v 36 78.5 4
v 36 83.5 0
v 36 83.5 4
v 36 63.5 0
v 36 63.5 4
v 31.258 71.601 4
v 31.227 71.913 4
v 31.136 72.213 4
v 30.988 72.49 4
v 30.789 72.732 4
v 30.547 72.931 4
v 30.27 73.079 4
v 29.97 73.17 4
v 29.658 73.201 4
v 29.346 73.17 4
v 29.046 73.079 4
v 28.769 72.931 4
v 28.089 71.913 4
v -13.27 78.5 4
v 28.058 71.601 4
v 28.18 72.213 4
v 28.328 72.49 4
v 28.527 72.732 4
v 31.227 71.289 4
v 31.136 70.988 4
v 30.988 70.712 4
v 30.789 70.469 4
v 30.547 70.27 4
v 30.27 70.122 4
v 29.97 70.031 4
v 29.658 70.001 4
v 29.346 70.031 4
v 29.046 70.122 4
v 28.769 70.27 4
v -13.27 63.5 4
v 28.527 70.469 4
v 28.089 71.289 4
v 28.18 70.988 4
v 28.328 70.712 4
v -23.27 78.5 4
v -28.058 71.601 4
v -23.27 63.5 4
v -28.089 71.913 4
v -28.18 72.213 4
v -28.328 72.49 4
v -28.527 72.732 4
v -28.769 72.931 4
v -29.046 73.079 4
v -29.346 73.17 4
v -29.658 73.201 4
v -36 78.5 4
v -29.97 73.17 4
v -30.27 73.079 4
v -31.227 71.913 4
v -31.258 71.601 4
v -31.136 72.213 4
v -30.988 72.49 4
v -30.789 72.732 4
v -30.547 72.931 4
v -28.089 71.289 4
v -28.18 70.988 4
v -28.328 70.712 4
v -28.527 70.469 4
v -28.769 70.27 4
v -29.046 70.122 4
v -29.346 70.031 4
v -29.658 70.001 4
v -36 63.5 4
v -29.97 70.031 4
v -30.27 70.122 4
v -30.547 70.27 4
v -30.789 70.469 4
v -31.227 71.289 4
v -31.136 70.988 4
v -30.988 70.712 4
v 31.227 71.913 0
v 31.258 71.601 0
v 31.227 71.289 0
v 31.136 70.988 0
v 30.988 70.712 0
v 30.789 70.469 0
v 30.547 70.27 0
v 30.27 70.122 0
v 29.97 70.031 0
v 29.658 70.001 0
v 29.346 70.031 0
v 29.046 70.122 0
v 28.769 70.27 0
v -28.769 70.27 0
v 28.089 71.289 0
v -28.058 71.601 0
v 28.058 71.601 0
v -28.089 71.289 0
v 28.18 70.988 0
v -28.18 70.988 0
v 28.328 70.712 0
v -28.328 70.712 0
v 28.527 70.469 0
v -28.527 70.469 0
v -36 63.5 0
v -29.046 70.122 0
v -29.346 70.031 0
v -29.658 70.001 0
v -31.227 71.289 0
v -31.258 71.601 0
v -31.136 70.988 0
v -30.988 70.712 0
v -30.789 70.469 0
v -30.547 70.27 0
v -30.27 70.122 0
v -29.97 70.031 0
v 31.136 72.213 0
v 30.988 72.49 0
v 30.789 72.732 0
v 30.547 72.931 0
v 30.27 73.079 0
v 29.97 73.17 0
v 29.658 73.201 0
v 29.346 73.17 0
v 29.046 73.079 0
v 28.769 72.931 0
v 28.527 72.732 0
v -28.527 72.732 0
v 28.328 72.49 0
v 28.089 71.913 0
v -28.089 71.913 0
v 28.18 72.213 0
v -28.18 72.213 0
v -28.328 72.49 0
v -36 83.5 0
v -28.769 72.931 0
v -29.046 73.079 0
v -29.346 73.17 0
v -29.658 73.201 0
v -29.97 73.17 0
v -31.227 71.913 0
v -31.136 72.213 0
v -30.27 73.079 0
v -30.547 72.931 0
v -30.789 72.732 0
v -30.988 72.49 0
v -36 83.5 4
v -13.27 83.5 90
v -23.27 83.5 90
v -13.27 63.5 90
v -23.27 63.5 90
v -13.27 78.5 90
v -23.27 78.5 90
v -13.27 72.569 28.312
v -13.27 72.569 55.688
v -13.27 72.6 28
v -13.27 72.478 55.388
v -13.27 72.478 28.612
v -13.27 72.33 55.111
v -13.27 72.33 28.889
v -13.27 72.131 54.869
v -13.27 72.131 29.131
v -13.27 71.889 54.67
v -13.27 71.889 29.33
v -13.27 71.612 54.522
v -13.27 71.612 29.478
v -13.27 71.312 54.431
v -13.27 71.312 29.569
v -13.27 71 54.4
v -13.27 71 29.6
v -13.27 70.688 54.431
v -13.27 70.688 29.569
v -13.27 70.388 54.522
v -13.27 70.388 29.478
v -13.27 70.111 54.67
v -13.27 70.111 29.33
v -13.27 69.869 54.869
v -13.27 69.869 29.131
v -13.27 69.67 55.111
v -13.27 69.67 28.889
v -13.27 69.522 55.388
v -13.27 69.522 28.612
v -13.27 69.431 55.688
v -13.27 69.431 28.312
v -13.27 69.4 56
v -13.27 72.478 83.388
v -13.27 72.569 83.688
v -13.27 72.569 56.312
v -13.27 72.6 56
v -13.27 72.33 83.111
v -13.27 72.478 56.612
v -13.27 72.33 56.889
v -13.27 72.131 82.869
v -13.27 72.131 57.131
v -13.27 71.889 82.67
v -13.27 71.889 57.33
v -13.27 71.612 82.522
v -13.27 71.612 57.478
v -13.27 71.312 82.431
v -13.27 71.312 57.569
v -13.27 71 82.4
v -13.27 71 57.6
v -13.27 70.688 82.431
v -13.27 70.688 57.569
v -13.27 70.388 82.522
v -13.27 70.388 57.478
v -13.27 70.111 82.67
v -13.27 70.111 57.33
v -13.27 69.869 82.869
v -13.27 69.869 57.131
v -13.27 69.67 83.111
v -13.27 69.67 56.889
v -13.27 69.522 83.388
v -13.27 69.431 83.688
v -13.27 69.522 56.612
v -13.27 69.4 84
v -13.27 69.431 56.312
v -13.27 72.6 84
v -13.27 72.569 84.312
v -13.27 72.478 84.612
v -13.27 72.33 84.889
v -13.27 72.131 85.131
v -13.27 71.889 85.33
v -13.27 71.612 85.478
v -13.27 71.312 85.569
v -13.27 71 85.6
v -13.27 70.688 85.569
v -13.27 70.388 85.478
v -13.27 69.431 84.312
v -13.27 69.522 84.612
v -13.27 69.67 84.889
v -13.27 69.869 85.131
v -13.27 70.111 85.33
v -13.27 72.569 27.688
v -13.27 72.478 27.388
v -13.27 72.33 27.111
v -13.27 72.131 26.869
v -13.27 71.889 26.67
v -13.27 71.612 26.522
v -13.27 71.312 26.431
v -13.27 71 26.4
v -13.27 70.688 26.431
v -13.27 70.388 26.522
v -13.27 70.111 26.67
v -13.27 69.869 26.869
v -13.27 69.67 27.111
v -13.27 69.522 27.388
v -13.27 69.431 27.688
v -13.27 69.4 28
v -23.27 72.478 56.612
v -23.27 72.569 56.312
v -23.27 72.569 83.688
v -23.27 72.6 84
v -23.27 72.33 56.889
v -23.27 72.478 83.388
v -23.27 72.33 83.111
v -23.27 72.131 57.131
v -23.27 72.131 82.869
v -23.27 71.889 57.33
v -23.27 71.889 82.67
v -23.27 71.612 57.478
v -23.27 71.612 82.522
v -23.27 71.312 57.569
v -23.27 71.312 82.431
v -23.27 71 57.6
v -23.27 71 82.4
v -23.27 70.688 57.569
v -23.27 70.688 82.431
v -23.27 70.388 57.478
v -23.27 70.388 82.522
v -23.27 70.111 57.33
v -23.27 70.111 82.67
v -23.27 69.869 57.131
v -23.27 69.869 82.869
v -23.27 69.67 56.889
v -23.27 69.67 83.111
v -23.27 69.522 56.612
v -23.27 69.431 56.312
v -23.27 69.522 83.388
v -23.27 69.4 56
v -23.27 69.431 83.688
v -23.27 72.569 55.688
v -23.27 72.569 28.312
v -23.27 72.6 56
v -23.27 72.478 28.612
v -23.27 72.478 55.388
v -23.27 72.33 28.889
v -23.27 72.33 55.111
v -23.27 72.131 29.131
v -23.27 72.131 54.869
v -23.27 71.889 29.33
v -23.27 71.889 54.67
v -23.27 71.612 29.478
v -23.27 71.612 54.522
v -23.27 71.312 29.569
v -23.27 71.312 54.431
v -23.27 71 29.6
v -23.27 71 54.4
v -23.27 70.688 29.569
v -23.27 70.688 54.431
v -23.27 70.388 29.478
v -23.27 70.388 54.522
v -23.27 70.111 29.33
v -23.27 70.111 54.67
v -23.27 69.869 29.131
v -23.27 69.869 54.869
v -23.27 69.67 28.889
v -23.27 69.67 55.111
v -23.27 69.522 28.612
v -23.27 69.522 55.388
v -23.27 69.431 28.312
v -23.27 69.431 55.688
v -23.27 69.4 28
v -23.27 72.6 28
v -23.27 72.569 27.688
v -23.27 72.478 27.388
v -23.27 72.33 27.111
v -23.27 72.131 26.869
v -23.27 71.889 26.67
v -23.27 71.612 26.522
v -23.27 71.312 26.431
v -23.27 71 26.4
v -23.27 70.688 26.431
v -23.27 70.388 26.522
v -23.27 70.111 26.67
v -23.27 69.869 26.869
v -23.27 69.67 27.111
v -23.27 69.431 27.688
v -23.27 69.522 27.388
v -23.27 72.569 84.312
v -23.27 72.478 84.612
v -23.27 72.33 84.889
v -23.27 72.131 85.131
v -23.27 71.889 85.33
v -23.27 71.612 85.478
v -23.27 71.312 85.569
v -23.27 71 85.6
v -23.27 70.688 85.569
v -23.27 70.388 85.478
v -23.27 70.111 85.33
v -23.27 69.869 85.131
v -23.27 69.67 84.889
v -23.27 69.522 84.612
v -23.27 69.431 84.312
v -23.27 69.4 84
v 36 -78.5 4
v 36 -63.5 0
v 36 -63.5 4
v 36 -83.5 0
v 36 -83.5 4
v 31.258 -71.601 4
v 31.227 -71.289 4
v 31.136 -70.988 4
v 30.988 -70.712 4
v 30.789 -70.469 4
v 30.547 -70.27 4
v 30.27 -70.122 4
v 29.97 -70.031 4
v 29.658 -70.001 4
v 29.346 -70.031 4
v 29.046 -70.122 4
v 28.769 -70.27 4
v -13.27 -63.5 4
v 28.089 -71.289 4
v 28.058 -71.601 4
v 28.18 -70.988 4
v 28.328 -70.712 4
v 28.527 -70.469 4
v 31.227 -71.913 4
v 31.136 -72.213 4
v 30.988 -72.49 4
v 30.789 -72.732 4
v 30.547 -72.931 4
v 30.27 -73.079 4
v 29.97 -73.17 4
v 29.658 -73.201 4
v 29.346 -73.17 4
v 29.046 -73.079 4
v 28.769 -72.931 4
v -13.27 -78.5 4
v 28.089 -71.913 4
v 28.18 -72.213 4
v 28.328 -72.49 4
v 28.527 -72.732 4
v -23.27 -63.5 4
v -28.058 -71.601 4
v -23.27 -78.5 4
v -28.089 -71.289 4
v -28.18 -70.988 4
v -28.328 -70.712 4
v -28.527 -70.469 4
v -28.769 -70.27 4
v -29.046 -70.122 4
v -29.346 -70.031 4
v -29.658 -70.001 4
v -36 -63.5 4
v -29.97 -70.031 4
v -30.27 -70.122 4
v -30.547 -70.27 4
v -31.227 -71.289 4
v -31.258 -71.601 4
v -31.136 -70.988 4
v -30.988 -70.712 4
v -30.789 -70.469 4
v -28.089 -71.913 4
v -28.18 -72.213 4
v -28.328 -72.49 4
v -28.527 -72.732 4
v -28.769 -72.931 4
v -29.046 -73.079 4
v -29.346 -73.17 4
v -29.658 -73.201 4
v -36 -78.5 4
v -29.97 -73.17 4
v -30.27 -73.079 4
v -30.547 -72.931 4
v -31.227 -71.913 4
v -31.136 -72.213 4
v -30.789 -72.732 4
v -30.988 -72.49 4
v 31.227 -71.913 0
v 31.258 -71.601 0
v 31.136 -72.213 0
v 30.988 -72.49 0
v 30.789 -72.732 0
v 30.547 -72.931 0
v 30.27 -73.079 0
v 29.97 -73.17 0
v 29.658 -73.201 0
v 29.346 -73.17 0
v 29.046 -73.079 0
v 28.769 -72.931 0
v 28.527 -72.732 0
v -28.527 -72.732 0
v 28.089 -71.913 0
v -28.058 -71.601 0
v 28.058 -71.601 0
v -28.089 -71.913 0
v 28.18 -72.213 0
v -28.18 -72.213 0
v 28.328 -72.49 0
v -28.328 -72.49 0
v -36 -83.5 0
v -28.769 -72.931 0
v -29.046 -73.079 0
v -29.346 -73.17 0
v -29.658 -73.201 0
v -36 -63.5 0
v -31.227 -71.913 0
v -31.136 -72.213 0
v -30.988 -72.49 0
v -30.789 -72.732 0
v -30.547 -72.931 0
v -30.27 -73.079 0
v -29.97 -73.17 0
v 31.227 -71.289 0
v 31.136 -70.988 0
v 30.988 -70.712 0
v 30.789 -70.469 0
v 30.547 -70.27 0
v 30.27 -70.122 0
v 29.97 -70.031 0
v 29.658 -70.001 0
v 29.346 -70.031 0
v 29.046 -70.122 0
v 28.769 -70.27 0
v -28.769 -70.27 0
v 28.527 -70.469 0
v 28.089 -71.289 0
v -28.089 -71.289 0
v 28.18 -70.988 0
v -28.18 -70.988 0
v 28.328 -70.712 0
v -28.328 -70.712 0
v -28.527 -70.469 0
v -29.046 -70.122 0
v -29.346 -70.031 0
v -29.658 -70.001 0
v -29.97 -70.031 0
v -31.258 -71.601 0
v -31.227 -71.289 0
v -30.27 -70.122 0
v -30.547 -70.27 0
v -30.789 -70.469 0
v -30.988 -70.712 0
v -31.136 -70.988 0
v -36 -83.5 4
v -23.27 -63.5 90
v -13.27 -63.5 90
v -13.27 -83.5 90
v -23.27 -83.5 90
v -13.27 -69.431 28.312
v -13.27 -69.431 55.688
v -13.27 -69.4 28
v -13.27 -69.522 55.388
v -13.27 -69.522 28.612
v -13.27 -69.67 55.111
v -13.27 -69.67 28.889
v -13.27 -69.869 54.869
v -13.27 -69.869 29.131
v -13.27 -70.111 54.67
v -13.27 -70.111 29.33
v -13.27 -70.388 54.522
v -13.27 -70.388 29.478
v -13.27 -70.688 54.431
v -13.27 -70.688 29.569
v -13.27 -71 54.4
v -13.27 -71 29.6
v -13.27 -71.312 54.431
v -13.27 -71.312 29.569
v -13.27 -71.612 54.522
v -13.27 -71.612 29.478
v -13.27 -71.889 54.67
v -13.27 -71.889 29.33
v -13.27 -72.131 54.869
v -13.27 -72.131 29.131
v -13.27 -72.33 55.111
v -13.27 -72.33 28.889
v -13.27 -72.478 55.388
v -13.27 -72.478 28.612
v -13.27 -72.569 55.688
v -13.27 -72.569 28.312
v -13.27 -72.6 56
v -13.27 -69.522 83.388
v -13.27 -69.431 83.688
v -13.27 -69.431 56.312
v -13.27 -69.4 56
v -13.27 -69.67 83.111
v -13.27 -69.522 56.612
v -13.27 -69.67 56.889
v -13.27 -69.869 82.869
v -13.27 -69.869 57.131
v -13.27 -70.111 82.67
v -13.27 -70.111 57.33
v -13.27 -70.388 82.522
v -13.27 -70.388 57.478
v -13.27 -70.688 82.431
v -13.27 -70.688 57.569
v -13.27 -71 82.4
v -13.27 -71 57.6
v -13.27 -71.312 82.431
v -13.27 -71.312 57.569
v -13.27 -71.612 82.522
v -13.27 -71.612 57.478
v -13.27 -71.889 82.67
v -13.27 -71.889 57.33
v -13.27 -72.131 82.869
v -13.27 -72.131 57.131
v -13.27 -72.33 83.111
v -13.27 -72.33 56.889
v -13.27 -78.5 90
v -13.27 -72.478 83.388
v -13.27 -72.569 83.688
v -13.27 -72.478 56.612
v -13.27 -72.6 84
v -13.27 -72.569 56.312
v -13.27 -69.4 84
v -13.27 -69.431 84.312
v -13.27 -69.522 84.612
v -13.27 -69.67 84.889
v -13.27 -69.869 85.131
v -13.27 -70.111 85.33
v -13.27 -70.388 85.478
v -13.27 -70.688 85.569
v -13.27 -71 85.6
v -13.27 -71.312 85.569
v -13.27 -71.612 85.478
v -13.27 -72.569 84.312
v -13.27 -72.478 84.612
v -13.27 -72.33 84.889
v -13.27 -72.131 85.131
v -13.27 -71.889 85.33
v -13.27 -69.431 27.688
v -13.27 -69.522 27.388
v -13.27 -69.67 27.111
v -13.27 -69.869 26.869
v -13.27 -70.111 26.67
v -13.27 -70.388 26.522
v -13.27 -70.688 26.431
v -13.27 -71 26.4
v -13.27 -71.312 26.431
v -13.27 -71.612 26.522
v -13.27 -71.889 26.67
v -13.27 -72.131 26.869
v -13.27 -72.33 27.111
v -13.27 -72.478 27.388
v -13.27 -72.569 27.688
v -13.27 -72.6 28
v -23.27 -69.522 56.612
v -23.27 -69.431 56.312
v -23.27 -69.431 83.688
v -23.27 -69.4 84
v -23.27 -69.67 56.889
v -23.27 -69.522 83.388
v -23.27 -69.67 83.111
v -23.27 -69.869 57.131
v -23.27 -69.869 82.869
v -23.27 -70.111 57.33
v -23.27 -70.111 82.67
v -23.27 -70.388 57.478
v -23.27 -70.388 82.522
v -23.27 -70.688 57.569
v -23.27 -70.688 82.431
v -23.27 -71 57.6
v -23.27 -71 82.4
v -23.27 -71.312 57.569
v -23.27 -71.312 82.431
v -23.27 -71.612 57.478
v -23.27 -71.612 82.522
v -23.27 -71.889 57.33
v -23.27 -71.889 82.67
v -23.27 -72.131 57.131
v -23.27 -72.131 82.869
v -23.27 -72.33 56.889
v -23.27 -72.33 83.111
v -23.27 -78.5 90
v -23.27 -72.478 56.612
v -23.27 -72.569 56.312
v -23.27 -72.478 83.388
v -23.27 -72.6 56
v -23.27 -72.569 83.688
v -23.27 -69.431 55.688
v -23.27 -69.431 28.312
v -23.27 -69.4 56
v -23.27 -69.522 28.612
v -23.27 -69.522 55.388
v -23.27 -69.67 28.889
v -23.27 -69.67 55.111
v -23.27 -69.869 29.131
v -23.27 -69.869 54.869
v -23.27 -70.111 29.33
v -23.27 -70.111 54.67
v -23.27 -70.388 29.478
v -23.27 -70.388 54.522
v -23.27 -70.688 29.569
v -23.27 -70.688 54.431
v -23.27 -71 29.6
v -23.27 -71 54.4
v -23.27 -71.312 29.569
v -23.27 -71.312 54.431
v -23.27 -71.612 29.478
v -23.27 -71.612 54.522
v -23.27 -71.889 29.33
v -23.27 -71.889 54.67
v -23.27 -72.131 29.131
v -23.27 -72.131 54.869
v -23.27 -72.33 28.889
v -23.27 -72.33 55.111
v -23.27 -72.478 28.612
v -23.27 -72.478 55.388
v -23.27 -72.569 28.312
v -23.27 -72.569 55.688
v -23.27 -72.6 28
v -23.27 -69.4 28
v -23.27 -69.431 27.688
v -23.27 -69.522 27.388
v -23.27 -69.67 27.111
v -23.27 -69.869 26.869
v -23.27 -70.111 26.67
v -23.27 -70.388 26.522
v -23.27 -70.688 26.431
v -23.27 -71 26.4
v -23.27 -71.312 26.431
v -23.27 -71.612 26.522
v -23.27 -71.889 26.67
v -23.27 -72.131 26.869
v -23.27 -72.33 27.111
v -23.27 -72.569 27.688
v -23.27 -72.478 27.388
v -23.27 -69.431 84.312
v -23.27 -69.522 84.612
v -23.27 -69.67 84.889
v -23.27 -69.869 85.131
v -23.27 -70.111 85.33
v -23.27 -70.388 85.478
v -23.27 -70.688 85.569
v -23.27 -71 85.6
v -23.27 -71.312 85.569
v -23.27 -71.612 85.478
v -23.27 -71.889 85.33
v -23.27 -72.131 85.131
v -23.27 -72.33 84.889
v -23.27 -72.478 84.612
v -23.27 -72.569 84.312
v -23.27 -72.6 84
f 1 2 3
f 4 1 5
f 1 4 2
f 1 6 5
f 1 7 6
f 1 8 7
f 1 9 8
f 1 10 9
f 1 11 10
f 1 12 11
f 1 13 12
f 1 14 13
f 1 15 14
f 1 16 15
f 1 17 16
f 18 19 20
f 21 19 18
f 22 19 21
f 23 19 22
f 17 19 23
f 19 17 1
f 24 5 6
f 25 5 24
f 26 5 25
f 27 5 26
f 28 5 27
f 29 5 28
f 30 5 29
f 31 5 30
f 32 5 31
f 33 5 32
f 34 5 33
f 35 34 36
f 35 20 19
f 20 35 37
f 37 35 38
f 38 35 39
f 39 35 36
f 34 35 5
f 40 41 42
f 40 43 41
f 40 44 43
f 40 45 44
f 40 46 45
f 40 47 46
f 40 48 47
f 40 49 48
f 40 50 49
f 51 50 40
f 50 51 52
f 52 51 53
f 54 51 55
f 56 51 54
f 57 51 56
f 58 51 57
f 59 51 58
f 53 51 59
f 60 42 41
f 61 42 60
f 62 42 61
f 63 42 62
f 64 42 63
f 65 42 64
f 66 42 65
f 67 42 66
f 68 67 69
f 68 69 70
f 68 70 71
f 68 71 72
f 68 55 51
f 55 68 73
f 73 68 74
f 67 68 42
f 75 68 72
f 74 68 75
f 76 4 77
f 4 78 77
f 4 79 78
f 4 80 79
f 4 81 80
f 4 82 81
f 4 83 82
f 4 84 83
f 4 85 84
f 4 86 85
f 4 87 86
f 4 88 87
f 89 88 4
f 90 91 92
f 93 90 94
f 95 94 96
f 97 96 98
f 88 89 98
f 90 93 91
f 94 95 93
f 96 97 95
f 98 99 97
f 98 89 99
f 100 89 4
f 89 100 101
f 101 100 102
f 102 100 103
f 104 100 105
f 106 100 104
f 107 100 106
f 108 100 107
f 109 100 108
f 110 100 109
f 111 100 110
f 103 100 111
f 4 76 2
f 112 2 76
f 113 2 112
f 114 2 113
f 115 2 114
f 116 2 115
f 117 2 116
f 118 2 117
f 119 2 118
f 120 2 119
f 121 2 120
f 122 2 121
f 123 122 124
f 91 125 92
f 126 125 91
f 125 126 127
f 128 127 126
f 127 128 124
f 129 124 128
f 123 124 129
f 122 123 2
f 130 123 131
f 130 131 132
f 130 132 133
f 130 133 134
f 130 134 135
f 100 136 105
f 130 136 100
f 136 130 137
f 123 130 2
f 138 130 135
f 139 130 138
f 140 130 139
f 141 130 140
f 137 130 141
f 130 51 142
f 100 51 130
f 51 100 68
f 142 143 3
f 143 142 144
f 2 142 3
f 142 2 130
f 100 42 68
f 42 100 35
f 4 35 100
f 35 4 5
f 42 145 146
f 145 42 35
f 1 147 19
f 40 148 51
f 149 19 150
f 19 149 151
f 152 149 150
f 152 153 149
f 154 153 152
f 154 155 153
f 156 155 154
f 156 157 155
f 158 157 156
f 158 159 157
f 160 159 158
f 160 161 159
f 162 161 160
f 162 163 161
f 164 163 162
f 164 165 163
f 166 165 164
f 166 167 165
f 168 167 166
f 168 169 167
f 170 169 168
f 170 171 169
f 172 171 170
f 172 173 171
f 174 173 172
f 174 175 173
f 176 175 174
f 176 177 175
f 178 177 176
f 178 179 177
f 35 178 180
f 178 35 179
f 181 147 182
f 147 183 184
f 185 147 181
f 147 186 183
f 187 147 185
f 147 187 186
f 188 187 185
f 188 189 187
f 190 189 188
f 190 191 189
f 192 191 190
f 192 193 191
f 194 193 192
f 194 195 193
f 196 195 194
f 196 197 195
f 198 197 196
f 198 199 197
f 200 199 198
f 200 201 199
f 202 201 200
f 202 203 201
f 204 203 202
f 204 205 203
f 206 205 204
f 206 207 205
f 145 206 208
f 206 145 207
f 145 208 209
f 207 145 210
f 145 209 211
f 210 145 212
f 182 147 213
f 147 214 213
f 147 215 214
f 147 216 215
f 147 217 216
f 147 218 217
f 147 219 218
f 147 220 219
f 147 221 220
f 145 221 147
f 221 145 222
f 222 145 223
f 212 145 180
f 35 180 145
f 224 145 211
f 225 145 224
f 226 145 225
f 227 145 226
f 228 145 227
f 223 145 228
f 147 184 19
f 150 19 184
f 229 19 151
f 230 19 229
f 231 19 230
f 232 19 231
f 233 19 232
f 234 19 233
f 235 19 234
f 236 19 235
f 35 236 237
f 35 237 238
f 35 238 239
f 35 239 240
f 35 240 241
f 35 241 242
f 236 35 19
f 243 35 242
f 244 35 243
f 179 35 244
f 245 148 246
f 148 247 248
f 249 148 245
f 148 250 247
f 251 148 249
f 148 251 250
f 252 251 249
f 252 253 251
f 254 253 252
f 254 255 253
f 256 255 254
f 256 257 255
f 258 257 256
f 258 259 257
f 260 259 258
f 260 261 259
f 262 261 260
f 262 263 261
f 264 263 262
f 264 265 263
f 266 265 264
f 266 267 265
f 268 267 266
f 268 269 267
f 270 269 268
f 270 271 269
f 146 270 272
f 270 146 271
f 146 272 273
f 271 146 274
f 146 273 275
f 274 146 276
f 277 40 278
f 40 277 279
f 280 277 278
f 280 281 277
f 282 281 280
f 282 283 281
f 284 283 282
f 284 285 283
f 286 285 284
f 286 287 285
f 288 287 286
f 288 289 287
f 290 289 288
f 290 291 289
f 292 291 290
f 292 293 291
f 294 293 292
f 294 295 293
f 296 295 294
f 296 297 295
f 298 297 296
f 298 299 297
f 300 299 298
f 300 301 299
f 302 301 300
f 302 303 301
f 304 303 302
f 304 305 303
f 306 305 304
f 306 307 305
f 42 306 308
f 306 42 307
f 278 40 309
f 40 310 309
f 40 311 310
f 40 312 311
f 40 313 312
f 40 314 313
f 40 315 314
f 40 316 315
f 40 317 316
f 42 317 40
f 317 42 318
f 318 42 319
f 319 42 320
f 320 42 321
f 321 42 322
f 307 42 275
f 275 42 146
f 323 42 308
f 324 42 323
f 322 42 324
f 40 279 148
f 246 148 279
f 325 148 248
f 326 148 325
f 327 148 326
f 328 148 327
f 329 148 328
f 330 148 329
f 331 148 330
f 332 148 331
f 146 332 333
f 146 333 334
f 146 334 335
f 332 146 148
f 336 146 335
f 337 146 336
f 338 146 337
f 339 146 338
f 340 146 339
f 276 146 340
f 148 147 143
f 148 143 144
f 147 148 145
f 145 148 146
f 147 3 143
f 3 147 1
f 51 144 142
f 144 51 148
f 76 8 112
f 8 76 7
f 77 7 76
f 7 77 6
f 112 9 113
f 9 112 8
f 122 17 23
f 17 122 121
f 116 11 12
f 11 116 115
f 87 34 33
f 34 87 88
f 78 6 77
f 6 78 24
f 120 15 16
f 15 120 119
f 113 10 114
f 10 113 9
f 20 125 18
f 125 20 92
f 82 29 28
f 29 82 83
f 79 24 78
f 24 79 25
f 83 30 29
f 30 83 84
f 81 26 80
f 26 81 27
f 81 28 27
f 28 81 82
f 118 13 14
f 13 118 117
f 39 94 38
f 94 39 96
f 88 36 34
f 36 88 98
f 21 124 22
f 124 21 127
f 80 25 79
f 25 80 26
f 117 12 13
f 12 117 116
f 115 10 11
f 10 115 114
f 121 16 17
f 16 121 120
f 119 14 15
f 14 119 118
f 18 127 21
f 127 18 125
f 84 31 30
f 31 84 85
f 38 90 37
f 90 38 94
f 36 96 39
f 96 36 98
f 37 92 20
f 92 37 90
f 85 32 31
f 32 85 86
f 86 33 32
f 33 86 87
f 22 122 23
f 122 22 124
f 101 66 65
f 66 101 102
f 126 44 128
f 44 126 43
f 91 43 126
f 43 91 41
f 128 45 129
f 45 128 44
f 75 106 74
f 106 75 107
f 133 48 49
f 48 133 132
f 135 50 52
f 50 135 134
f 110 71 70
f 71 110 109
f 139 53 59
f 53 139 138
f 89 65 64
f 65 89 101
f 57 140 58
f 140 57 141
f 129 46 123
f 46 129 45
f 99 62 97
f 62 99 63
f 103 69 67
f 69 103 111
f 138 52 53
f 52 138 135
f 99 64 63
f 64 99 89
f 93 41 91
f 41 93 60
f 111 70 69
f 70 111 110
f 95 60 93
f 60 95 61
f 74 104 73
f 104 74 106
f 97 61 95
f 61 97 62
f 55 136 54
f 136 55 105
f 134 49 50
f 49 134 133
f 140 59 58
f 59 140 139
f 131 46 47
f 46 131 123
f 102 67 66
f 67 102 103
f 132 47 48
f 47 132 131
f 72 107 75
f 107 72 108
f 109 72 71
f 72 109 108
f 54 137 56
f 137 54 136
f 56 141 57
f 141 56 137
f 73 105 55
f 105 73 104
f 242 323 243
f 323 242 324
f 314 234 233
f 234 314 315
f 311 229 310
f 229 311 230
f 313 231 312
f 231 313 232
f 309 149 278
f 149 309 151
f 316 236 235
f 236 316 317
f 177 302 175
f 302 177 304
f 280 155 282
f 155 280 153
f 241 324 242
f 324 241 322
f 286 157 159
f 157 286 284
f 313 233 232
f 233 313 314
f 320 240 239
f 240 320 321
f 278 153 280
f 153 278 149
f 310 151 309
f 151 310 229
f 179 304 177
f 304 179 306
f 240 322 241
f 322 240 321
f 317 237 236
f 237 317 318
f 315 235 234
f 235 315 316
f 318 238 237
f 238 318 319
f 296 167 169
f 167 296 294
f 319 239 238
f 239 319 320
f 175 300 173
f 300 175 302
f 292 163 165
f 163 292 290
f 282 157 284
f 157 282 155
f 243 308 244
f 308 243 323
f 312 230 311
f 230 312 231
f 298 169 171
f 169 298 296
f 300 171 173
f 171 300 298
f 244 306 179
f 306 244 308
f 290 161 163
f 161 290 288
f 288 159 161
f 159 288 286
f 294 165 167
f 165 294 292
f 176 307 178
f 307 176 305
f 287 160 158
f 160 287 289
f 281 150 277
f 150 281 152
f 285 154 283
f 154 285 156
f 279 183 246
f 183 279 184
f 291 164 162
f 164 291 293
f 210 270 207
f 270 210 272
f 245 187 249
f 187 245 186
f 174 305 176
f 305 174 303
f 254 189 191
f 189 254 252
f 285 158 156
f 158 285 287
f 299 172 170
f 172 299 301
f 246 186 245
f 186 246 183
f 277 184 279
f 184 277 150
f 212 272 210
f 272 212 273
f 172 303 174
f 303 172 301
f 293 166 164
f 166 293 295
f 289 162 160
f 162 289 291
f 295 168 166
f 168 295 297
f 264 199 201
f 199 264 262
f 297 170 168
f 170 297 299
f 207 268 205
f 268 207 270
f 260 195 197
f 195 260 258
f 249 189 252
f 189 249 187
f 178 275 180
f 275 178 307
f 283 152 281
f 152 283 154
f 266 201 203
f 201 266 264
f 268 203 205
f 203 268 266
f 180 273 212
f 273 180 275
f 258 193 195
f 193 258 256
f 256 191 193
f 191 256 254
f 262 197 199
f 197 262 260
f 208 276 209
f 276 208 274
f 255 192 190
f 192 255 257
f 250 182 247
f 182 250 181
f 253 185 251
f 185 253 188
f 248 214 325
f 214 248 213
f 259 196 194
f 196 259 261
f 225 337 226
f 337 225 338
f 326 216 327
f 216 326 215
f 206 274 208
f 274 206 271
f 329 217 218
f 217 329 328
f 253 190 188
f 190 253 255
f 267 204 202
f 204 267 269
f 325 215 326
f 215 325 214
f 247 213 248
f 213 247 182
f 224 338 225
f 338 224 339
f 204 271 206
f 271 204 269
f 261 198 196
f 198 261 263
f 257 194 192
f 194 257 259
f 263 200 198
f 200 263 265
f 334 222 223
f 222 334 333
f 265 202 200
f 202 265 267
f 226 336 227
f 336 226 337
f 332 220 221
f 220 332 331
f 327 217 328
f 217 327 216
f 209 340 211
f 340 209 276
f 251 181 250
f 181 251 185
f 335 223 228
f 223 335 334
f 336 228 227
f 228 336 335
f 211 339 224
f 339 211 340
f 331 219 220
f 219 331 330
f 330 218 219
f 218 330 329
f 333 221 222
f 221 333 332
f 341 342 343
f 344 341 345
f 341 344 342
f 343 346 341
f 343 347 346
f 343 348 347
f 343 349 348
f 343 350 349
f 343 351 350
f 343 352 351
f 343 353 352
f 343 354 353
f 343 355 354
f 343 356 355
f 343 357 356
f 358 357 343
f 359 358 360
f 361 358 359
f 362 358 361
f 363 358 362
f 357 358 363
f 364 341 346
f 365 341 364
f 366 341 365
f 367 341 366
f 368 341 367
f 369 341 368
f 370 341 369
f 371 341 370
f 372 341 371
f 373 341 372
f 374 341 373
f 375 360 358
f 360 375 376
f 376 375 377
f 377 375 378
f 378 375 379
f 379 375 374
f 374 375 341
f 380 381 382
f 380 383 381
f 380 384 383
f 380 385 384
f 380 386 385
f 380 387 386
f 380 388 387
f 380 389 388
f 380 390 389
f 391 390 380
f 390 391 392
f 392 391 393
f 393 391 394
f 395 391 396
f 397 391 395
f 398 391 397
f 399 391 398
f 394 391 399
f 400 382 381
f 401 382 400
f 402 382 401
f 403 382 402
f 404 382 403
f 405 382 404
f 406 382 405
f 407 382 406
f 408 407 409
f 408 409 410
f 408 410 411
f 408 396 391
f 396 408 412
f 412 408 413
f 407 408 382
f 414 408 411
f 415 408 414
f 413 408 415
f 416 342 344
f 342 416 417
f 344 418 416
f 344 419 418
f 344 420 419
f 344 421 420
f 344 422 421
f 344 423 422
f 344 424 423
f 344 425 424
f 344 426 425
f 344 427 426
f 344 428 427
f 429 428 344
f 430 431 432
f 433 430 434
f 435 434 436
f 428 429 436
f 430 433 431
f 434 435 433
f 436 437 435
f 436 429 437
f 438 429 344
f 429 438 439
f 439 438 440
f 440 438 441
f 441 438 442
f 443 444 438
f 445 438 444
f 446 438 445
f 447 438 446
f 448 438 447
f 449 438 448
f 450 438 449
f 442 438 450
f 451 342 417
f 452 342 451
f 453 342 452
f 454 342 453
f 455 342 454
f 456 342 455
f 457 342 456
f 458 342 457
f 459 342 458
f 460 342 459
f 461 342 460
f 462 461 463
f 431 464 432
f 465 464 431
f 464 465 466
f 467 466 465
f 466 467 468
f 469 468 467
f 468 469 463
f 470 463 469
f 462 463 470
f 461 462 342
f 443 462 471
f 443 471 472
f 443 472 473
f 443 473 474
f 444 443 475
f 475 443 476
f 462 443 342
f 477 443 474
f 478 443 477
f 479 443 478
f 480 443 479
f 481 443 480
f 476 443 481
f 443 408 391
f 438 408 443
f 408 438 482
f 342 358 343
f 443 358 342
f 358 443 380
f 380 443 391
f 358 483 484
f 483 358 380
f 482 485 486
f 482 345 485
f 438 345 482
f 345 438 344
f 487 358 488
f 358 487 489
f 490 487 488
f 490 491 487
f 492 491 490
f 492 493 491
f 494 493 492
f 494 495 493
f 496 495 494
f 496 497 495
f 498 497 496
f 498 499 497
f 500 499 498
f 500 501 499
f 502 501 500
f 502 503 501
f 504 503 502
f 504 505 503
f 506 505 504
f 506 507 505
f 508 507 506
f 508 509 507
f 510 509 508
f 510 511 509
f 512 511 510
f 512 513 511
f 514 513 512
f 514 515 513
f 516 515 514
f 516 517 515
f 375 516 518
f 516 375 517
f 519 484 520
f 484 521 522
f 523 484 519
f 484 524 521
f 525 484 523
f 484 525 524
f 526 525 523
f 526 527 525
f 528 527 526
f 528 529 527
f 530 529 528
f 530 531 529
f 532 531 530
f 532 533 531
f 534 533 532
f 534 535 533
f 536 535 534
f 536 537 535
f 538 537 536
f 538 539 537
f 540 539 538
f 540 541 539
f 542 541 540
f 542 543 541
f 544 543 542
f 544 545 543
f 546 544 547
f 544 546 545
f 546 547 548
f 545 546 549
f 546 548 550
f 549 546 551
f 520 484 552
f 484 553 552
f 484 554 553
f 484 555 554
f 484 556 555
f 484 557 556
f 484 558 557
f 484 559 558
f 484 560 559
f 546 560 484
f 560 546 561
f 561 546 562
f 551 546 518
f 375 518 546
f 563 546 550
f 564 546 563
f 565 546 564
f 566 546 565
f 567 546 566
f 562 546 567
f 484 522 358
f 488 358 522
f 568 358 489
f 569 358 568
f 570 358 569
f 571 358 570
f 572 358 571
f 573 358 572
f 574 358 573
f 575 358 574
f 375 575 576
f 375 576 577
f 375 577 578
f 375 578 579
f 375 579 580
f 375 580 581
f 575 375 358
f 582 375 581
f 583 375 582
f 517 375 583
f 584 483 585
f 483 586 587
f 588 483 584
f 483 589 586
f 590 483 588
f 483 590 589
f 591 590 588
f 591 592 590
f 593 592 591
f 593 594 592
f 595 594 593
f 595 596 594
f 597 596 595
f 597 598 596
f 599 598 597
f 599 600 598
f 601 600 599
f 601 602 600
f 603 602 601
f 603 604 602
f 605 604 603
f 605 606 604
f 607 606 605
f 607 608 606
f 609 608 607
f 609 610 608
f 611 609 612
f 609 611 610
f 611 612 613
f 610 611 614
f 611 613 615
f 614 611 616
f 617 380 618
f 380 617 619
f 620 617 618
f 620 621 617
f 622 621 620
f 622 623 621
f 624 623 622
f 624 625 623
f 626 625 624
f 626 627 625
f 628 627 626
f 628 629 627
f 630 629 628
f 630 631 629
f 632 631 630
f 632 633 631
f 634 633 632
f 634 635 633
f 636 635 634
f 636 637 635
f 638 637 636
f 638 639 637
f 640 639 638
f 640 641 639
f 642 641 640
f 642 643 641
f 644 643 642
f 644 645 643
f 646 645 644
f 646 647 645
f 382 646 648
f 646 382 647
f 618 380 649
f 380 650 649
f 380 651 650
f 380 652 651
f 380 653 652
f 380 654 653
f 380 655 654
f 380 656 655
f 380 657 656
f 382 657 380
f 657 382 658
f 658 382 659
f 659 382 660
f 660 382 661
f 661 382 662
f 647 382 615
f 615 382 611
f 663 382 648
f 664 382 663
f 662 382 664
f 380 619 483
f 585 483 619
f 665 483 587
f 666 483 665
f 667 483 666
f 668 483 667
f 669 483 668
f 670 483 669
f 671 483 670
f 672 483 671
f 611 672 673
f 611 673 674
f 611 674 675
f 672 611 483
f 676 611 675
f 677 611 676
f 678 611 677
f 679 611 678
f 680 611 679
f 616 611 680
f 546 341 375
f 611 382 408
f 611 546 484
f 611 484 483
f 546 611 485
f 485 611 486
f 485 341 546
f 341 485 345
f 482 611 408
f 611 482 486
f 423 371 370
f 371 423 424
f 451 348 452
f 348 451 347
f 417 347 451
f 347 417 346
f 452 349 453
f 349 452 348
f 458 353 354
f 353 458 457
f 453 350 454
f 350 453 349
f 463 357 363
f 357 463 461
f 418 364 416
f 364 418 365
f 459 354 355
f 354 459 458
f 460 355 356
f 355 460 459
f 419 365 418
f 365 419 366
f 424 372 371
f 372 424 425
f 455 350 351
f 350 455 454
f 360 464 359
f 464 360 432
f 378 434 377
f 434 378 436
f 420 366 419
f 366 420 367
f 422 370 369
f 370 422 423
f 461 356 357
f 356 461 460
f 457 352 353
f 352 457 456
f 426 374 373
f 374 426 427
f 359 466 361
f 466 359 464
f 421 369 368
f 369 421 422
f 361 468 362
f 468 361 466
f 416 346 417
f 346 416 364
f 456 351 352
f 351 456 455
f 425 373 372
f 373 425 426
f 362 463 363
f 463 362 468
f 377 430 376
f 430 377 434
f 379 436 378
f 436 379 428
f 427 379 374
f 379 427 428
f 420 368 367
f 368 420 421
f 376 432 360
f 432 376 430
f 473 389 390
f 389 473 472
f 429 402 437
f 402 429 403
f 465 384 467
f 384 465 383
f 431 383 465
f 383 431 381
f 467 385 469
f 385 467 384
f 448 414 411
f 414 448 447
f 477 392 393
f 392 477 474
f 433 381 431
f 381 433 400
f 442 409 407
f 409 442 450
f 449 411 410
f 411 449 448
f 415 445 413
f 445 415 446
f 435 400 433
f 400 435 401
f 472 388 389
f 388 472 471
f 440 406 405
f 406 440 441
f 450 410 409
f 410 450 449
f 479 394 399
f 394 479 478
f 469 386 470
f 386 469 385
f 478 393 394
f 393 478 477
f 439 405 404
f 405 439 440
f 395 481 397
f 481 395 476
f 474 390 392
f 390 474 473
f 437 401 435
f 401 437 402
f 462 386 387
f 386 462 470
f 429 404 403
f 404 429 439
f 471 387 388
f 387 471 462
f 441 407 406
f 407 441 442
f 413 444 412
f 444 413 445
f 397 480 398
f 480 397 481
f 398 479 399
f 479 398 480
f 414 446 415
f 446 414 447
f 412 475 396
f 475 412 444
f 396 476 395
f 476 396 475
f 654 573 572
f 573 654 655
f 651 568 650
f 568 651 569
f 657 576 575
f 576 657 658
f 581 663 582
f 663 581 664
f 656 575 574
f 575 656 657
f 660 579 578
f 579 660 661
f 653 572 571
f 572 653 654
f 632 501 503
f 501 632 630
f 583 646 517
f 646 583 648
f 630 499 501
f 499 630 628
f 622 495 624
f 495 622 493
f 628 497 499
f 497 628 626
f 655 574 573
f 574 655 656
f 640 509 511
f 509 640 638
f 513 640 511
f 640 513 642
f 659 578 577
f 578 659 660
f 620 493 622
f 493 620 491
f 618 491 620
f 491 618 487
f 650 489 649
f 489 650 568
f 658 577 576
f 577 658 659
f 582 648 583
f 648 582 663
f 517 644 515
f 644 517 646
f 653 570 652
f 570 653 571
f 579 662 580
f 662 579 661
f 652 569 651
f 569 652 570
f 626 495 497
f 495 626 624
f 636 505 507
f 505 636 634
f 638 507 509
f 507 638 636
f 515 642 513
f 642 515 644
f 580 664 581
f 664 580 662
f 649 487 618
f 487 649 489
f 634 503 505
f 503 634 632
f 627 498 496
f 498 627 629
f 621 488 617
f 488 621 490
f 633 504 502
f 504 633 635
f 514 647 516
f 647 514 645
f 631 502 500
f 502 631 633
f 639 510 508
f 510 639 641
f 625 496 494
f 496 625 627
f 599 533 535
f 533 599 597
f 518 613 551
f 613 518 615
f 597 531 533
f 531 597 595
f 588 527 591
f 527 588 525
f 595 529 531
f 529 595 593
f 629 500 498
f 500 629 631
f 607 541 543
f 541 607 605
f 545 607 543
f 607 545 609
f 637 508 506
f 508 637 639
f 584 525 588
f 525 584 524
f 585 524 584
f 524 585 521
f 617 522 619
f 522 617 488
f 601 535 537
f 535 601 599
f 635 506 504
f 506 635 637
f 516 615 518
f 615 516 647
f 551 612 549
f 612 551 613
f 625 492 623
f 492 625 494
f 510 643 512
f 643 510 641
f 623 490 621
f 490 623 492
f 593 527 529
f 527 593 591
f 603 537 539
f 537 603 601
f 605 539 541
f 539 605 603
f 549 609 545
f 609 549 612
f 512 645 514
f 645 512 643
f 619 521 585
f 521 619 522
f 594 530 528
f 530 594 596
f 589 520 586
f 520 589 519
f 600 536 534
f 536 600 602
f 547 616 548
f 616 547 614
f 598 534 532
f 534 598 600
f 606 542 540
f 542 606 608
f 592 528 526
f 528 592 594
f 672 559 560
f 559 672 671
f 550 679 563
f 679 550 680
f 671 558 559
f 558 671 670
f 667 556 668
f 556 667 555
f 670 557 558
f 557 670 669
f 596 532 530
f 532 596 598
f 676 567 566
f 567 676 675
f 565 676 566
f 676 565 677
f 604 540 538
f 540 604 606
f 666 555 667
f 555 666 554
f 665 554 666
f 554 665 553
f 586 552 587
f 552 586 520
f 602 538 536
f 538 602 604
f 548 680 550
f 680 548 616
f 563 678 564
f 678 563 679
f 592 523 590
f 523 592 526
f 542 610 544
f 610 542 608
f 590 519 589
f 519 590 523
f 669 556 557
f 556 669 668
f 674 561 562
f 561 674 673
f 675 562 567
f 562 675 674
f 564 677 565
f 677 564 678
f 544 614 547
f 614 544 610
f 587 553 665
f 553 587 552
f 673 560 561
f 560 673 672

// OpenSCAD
// gantry_base — v2 屏幕支架: 门形底座 A/B (与 build_base.py 同参)
// 局部系 = 盘坐标系, Z0 = 盘顶面。A(+Y)/B(−Y) 互为镜像左右手件。
// 连接 = 贯通螺丝: 沉头 M3×20 穿 板(6)+塔(10), 塔背面垫片+螺母 (无嵌件)。

SCREEN_T = 7.27;  FIN_T = 6;
FIN_X0 = -SCREEN_T - FIN_T;    // -13.27 塔前面
M3 = 3.2;
FOOT_T = 4;  FOOT_HX = 36;  FOOT_Y0 = 63.5;  FOOT_Y1 = 83.5;  // 外缘平直 (弧裁已改平)
DISC_R = 85;  RIM_R = 77.5;
TWR_Y0 = 63.5;  TWR_Y1 = 78.5;  TWR_TOP = 90;
TWR_D = 10;  TWR_XB = FIN_X0 - TWR_D;          // -23.27 直背 (坐螺母)
// (加强墩已删 2026-07-03: 压住后脚孔 (-29.66,±71.6), 脚螺丝从上打不进)
WALL_T = 5;                                     // 外侧筋墙 (外面与脚外缘共面 = 打印底面)
WALL_PTS = [[-36,4],[36,4],[-13.27,90],[-23.27,90]];   // 满三角 (内侧小筋已删)
JOINT_Y = 71;  JOINT_Z = [28, 56, 84];

module piece(s) {   // s = +1 (A) / -1 (B)
    difference() {
        union() {
            translate([-FOOT_HX, s > 0 ? FOOT_Y0 : -FOOT_Y1, 0])   // 脚 (矩形, 外缘平直)
                cube([2*FOOT_HX, FOOT_Y1 - FOOT_Y0, FOOT_T]);
            // 塔柱 (直背方柱)
            translate([0, s > 0 ? TWR_Y1 : -TWR_Y0, 0]) rotate([90, 0, 0])
                linear_extrude(TWR_Y1 - TWR_Y0)
                    polygon([[TWR_XB, FOOT_T], [FIN_X0, FOOT_T], [FIN_X0, TWR_TOP],
                             [TWR_XB, TWR_TOP]]);
            // 外侧筋墙 (满三角, 塔顶直边拉到脚两端)
            translate([0, s > 0 ? FOOT_Y1 : -TWR_Y1, 0]) rotate([90, 0, 0])
                linear_extrude(WALL_T) polygon(WALL_PTS);
        }
        for (a = [67.5, 112.5])   // 2 脚孔 (借盘环孔)
            translate([RIM_R*cos(a), s*RIM_R*sin(a), -1])
                cylinder(h = FOOT_T + 2, d = M3, $fn = 32);
        for (z = JOINT_Z)         // 3 贯通连接孔
            translate([TWR_XB - 1, s*JOINT_Y, z]) rotate([0, 90, 0])
                cylinder(h = TWR_D + 2, d = M3, $fn = 32);
    }
}

piece(1);    // A (+Y)
piece(-1);   // B (−Y)
